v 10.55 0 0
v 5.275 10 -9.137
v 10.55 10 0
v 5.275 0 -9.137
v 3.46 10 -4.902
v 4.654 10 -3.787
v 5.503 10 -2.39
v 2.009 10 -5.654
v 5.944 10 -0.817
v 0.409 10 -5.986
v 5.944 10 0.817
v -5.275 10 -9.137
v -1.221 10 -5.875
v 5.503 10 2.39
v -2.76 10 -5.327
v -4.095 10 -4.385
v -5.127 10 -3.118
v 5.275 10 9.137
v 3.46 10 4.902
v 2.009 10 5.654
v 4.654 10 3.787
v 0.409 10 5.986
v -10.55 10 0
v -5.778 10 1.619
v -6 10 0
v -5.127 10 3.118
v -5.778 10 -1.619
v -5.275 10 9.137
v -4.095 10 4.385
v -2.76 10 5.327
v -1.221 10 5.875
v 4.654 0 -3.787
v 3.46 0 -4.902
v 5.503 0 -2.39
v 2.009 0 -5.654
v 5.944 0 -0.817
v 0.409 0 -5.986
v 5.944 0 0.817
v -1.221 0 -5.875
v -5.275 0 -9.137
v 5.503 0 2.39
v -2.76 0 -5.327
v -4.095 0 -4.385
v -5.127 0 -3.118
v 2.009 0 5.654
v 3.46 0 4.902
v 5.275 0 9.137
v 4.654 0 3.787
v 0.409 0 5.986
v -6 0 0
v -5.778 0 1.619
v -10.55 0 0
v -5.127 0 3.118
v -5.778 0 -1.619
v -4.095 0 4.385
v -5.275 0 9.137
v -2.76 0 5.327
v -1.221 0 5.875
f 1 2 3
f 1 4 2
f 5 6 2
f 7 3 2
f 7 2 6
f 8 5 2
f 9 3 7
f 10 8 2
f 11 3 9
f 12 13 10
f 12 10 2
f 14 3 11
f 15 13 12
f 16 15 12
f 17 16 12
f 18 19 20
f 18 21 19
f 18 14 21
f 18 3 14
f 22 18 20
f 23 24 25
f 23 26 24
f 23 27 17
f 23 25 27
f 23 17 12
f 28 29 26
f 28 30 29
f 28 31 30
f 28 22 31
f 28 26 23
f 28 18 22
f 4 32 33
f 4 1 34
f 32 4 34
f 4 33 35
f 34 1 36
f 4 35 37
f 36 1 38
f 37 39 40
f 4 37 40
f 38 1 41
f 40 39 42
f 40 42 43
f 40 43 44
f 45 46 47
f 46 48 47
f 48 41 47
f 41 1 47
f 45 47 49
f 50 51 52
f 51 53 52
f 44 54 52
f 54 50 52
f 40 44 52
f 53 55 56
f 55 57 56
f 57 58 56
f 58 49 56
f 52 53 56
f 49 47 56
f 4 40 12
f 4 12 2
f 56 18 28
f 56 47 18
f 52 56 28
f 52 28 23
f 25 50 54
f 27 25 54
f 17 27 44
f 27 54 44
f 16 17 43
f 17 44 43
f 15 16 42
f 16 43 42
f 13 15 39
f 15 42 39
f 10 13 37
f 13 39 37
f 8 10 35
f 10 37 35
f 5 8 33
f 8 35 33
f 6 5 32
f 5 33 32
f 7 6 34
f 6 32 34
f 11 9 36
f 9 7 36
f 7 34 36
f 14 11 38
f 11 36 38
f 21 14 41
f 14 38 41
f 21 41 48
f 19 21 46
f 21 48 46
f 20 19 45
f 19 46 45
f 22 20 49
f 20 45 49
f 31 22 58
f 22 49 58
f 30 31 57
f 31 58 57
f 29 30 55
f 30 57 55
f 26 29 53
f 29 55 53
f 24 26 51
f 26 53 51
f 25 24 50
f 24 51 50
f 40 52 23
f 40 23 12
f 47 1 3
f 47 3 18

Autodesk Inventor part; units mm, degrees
ref_plane "YZ Plane" through (0, 0, 0) normal (1, 0, 0) x (0, 1, 0)
ref_plane "XZ Plane" through (0, 0, 0) normal (0, 1, 0) x (-1, 0, 0)
ref_plane "XY Plane" through (0, 0, 0) normal (0, 0, 1) x (1, 0, 0)
sketch "Эскиз1" plane through (0, 0, 0) normal (0, 1, 0) x (-1, 0, 0)
  line L0 (10.55, 0) -> (5.275, -9.1366)
  line L1 (5.275, -9.1366) -> (-5.275, -9.1366)
  line L2 (-5.275, -9.1366) -> (-10.55, 0)
  line L3 (-10.55, 0) -> (-5.275, 9.1366)
  line L4 (-5.275, 9.1366) -> (5.275, 9.1366)
  line L5 (5.275, 9.1366) -> (10.55, 0)
  circle A0 centre (0, 0) radius 6
  dimension "d0" = 21.1
  dimension "d1" = 12
extrude "Выдавливание1" add sketch "Эскиз1" along normal blind 10
thread "Резьба1" size "M12x1.75" class "6H" standard "ANSI Metric M Profile" full length
properties part number "KB33-046-002-003 - Фиксирующая гайка"
